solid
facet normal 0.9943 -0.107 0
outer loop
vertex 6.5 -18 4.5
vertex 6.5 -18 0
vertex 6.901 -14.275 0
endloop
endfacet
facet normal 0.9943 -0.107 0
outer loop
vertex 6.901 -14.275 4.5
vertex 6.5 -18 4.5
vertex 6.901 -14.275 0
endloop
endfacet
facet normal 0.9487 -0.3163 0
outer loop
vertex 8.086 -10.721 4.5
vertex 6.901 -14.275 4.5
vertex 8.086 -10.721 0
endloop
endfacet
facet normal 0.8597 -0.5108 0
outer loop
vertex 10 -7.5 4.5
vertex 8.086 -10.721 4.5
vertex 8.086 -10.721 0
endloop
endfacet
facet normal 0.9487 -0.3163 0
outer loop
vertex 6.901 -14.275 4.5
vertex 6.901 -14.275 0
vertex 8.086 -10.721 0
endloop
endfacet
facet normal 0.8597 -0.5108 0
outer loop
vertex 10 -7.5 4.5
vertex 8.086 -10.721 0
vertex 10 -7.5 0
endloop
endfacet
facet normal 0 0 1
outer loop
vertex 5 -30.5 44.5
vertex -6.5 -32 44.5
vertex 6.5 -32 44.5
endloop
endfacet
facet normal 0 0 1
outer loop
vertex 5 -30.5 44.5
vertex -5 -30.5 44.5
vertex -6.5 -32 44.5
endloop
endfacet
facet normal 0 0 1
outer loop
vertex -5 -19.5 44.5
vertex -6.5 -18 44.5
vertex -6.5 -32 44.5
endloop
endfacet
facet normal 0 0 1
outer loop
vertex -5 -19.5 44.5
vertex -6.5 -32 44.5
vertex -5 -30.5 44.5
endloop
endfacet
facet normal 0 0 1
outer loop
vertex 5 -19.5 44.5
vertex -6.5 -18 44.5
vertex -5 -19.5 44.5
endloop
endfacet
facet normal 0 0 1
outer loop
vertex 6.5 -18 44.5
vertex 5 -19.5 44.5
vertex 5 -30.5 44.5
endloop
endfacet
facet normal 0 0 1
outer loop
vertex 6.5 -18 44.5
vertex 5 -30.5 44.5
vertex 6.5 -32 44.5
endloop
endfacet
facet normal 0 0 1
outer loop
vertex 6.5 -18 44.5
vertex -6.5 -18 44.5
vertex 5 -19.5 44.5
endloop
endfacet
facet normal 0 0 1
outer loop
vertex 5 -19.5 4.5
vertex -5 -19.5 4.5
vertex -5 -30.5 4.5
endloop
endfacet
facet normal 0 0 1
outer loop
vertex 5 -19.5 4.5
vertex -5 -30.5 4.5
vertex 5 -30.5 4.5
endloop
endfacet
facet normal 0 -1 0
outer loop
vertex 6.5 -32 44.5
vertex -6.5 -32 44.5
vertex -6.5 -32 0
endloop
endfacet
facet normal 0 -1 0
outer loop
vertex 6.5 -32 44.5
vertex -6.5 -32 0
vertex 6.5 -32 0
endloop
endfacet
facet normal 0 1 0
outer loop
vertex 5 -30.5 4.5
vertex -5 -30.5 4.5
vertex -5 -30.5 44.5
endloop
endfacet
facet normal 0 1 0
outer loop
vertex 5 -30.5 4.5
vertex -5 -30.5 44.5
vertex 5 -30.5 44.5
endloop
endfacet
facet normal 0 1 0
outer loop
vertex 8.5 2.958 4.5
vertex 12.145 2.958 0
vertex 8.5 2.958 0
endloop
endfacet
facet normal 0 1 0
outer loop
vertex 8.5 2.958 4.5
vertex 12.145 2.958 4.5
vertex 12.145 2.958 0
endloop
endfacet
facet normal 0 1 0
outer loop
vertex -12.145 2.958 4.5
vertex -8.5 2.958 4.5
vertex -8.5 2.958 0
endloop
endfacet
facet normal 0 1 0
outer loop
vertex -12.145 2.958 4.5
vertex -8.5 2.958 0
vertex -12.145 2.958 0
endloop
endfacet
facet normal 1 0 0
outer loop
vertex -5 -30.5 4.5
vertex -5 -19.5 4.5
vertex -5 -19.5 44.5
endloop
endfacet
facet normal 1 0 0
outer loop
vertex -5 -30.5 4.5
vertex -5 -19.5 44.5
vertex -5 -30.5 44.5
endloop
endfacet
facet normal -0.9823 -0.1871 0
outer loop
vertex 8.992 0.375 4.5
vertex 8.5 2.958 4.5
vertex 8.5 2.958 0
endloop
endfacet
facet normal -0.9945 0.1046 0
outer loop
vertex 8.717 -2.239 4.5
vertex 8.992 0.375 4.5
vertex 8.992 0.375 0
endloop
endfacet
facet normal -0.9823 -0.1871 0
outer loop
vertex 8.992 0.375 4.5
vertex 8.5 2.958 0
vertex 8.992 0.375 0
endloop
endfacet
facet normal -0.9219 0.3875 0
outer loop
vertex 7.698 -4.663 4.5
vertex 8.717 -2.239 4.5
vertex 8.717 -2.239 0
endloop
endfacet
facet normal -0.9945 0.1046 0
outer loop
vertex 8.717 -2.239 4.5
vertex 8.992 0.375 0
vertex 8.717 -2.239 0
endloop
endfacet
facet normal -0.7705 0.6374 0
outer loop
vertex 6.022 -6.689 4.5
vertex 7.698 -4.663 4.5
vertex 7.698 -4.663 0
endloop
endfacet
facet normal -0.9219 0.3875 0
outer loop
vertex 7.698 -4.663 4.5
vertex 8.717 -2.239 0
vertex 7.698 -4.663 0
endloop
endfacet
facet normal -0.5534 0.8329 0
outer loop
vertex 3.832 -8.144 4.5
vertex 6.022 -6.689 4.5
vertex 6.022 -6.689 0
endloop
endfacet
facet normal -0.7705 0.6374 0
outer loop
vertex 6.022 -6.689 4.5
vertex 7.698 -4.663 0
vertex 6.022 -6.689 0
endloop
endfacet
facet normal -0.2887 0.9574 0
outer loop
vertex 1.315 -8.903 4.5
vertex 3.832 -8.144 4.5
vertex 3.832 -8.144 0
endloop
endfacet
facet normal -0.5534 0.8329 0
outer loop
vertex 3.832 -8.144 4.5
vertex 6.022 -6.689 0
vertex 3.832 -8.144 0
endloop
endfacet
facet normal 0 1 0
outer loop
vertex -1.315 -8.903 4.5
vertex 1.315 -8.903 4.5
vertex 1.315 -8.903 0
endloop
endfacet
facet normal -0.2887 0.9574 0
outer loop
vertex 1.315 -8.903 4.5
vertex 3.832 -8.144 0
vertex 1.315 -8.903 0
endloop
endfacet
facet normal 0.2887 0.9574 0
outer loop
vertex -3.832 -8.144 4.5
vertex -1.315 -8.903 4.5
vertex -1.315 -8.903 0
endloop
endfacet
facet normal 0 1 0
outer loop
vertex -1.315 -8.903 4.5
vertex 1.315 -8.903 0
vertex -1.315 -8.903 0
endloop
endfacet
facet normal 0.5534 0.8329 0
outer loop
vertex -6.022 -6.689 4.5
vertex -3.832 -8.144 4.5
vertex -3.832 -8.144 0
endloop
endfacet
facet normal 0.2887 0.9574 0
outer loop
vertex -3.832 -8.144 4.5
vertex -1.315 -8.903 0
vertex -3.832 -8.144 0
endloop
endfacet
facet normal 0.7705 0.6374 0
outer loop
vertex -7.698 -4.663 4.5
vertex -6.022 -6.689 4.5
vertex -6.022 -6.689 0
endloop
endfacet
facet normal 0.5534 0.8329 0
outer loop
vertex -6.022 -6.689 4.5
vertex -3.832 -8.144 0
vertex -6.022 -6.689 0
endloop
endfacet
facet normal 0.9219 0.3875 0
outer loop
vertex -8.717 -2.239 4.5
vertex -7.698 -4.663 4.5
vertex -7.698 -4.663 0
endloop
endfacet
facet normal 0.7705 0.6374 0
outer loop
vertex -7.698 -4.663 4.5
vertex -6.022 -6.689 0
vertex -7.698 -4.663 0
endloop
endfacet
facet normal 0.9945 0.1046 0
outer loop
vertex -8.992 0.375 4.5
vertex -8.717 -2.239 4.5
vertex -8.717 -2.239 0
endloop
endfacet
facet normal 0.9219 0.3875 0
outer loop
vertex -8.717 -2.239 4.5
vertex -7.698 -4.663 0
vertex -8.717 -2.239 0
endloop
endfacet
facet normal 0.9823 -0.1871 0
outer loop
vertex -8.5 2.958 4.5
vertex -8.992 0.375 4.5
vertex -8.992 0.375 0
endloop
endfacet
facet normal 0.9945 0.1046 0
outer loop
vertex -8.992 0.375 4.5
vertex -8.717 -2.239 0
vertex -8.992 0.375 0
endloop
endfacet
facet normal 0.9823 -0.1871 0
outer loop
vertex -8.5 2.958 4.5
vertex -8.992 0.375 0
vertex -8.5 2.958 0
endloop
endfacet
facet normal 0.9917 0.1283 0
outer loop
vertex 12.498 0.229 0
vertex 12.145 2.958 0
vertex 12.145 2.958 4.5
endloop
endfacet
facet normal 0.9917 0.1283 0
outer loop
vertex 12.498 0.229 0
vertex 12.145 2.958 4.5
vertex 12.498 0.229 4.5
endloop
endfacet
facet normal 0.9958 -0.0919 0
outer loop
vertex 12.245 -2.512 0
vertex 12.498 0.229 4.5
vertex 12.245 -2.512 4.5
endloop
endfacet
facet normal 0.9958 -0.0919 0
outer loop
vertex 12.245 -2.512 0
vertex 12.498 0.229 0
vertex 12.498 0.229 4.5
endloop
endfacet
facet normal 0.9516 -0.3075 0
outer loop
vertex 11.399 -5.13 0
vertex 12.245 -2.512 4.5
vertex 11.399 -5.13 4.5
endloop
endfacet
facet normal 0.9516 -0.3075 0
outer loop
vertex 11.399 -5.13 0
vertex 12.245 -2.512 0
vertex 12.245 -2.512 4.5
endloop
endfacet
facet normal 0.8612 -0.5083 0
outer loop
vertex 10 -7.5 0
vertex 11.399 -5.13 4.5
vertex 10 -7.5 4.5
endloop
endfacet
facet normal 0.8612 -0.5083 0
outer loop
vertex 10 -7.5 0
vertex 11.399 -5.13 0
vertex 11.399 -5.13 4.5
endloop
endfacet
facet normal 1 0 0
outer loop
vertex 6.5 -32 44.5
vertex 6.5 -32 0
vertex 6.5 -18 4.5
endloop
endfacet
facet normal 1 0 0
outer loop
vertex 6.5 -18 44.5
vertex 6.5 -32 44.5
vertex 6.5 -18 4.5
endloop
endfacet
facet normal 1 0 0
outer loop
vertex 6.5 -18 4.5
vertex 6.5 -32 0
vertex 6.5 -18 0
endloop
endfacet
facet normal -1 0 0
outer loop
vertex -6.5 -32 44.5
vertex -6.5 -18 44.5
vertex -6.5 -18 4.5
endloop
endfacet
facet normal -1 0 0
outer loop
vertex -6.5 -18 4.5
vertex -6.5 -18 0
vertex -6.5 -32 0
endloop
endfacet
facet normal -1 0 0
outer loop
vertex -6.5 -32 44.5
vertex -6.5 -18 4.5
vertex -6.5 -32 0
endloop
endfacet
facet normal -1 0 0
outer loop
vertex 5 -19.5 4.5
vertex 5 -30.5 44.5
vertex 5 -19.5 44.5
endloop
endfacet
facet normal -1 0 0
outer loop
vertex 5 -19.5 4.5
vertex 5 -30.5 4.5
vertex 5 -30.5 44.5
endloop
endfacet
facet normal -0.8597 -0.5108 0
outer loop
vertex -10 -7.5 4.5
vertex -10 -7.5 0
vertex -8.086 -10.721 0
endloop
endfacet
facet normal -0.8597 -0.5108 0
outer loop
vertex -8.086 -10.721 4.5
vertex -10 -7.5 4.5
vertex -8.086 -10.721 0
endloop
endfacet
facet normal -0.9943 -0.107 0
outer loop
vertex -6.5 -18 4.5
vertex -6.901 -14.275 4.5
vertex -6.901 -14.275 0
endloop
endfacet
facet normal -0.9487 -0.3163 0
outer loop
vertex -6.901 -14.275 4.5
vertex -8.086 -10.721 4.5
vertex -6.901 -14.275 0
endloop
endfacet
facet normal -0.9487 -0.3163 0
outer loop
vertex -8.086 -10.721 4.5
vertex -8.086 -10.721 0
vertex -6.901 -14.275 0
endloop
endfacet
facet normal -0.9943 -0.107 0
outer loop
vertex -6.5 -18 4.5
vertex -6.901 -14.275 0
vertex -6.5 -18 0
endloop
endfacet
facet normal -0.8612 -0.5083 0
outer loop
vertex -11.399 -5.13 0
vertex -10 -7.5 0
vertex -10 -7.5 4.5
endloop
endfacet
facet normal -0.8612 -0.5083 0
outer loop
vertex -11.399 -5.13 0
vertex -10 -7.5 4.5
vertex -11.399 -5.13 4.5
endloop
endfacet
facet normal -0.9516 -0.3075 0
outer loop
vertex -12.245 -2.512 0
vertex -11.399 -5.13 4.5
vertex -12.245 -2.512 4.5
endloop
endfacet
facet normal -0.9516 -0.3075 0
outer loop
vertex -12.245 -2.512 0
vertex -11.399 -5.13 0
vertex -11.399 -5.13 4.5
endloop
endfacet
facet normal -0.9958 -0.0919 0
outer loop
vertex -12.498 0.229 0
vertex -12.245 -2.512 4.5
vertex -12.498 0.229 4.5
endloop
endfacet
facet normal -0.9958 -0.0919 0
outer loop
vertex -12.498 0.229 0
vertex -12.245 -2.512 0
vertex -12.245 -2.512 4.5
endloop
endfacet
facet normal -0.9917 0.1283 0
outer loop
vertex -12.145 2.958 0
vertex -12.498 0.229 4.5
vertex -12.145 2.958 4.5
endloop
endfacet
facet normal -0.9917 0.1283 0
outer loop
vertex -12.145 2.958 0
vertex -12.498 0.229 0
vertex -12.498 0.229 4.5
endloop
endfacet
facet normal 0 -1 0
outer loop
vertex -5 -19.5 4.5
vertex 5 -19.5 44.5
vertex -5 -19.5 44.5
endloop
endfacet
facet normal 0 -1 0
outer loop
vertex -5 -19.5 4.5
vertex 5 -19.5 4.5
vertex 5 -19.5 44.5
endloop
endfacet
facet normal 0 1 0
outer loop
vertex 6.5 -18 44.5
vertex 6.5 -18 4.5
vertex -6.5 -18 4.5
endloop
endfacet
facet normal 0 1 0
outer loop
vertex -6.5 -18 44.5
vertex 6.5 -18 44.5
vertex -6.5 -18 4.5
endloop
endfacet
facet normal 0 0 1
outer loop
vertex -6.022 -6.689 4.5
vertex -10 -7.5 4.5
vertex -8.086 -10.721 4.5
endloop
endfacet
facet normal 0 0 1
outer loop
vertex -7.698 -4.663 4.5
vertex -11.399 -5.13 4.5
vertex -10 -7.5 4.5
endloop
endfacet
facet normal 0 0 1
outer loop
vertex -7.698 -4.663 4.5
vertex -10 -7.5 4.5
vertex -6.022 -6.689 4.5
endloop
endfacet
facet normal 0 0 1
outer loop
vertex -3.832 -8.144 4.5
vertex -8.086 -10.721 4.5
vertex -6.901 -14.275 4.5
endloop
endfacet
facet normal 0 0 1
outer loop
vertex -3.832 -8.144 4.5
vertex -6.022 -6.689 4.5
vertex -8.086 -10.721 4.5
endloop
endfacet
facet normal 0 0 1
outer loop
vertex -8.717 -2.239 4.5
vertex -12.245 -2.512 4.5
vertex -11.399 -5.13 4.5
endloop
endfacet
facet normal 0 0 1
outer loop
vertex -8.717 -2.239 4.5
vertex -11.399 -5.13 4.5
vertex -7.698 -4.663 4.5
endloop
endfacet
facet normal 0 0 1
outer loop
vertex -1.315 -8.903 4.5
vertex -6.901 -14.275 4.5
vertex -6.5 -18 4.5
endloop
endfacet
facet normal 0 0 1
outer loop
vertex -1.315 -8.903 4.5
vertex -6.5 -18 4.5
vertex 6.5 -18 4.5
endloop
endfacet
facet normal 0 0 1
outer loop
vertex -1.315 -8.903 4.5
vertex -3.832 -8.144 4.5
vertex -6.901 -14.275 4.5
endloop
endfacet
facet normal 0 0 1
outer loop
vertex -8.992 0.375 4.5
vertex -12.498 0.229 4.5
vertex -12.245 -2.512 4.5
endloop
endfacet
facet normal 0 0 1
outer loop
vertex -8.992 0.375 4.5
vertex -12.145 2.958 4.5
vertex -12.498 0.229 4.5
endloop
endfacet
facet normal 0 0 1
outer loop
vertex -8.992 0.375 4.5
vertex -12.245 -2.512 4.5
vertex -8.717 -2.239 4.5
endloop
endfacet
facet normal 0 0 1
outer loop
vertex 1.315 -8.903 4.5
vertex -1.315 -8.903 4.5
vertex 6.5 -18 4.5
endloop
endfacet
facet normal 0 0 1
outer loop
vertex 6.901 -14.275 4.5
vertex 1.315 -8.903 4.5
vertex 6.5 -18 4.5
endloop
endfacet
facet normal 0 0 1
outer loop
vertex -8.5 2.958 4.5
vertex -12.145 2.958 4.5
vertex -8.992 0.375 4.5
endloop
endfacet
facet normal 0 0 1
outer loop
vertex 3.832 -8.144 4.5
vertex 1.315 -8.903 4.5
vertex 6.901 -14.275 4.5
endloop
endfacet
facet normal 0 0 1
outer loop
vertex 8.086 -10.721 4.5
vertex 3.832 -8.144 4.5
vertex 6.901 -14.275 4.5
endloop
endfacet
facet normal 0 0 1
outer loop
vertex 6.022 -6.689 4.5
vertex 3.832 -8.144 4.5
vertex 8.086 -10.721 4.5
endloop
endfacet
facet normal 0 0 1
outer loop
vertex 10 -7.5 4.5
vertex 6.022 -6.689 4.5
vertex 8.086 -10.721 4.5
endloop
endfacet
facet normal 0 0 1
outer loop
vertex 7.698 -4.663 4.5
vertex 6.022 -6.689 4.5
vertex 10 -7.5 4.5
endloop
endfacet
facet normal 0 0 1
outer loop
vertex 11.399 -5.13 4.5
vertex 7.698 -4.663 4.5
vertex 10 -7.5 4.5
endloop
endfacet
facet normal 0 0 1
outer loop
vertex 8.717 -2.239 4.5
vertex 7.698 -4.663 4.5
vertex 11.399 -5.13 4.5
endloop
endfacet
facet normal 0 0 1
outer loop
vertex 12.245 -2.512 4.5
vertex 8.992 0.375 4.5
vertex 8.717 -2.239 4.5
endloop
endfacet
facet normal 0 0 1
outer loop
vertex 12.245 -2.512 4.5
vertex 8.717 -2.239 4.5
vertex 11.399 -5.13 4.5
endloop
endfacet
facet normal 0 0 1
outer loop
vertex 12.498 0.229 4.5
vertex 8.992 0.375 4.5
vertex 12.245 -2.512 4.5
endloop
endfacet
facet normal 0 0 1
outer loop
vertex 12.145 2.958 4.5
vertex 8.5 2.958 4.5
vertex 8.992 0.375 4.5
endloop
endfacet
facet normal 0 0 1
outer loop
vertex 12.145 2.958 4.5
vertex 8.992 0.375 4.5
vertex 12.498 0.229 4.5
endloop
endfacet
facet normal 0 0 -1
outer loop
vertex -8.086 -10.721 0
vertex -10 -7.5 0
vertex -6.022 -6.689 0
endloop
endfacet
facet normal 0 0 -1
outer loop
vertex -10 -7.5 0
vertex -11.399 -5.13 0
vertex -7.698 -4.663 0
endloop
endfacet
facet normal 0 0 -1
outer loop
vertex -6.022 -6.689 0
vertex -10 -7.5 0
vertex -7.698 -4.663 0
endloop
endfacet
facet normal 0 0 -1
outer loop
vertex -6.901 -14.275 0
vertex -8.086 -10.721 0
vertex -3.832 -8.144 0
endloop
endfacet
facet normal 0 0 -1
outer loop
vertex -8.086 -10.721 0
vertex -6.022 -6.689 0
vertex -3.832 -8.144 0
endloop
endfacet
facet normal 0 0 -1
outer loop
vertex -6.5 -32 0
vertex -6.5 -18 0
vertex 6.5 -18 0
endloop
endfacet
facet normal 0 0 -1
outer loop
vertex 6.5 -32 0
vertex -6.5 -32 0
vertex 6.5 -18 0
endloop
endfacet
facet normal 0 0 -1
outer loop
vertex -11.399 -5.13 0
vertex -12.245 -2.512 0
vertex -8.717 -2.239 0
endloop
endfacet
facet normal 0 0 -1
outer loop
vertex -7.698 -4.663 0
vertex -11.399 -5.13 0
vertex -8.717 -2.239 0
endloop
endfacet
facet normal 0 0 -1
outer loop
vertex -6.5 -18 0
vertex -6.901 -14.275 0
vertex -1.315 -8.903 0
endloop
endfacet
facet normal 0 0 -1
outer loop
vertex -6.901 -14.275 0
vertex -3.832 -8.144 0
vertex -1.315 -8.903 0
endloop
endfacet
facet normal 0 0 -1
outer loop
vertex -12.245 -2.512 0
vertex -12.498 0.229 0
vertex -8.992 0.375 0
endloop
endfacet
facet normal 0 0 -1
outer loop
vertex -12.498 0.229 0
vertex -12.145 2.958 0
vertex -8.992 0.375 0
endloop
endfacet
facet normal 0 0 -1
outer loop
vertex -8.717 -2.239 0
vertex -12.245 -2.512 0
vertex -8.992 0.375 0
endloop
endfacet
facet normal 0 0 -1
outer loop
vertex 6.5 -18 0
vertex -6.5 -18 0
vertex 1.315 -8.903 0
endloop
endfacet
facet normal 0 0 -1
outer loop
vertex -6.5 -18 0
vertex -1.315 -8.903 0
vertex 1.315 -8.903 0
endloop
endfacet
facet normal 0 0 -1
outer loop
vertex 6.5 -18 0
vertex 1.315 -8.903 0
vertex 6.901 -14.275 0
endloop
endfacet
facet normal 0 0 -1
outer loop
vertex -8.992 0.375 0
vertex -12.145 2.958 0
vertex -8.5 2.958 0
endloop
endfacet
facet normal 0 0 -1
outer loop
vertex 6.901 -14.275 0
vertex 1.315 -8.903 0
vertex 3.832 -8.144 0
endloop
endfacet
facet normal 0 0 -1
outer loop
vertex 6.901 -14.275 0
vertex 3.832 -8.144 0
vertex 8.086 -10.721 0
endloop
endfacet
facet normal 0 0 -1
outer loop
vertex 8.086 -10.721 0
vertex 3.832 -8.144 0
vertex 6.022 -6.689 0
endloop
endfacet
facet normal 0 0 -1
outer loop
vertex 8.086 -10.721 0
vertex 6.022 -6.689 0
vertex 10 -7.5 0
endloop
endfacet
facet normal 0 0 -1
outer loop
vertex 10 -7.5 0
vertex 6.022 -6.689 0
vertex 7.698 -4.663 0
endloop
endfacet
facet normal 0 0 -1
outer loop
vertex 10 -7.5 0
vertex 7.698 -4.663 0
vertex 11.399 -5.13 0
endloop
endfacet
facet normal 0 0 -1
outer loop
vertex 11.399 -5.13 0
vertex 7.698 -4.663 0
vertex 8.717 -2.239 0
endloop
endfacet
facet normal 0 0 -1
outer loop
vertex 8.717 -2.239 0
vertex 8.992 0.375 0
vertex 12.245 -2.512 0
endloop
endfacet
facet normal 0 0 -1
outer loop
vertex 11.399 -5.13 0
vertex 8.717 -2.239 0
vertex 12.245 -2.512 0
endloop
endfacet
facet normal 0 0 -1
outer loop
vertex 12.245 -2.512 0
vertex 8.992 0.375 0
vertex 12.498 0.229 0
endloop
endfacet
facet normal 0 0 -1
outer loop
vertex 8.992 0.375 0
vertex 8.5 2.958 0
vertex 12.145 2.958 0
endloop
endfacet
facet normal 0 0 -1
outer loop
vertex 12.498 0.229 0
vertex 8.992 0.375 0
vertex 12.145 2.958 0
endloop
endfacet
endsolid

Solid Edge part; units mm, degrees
sketch "Sketch1" plane through (0, 0, 0) normal (0, 0, 1) x (1, 0, 0)
  line L0 (6.5, -32) -> (6.5, -18)
  arc A0 (6.5, -18) -> (10, -7.5) centre (24, -18) cw
  arc A1 (-6.5, -18) -> (-10, -7.5) centre (-24, -18) ccw
  line L1 (-6.5, -18) -> (-6.5, -32)
  line L2 (-6.5, -32) -> (6.5, -32)
  arc A2 (-10, -7.5) -> (10, -7.5) centre (0, 0) cw
  circle A3 centre (0, 0) radius 9
extrude "Protrusion1" add sketch "Sketch1" along normal blind 4.5
sketch "Sketch2" plane through (0, -9.75, 4.5) normal (0, 0, 1) x (1, 0, 0)
  line L0 (5, -20.75) -> (5, -9.75)
  line L1 (5, -9.75) -> (-5, -9.75)
  line L2 (-5, -9.75) -> (-5, -20.75)
  line L3 (-5, -20.75) -> (5, -20.75)
  line L4 (6.5, -22.25) -> (6.5, -8.25)
  line L5 (6.5, -8.25) -> (-6.5, -8.25)
  line L6 (-6.5, -8.25) -> (-6.5, -22.25)
  line L7 (-6.5, -22.25) -> (6.5, -22.25)
extrude "ExtrudedProtrusion_2" add sketch "Sketch2" along normal blind 40
extrude "Cutout1" [suppressed]
sketch "Sketch3" plane through (0, -2.75, 4.5) normal (0, 0, 1) x (1, 0, 0)
  line L0 (-14.9811, 5.708) -> (-5.4512, 20.4845)
  line L1 (-5.4512, 20.4845) -> (11.5832, 18.4165)
  line L2 (11.5832, 18.4165) -> (13.7791, 5.708)
  line L3 (13.7791, 5.708) -> (8.5, 5.708)
  line L4 (-8.5, 5.708) -> (8.5, 5.708)
  line L5 (-8.5, 5.708) -> (-14.9811, 5.708)
extrude "Cutout2" cut sketch "Sketch3" against normal through all
